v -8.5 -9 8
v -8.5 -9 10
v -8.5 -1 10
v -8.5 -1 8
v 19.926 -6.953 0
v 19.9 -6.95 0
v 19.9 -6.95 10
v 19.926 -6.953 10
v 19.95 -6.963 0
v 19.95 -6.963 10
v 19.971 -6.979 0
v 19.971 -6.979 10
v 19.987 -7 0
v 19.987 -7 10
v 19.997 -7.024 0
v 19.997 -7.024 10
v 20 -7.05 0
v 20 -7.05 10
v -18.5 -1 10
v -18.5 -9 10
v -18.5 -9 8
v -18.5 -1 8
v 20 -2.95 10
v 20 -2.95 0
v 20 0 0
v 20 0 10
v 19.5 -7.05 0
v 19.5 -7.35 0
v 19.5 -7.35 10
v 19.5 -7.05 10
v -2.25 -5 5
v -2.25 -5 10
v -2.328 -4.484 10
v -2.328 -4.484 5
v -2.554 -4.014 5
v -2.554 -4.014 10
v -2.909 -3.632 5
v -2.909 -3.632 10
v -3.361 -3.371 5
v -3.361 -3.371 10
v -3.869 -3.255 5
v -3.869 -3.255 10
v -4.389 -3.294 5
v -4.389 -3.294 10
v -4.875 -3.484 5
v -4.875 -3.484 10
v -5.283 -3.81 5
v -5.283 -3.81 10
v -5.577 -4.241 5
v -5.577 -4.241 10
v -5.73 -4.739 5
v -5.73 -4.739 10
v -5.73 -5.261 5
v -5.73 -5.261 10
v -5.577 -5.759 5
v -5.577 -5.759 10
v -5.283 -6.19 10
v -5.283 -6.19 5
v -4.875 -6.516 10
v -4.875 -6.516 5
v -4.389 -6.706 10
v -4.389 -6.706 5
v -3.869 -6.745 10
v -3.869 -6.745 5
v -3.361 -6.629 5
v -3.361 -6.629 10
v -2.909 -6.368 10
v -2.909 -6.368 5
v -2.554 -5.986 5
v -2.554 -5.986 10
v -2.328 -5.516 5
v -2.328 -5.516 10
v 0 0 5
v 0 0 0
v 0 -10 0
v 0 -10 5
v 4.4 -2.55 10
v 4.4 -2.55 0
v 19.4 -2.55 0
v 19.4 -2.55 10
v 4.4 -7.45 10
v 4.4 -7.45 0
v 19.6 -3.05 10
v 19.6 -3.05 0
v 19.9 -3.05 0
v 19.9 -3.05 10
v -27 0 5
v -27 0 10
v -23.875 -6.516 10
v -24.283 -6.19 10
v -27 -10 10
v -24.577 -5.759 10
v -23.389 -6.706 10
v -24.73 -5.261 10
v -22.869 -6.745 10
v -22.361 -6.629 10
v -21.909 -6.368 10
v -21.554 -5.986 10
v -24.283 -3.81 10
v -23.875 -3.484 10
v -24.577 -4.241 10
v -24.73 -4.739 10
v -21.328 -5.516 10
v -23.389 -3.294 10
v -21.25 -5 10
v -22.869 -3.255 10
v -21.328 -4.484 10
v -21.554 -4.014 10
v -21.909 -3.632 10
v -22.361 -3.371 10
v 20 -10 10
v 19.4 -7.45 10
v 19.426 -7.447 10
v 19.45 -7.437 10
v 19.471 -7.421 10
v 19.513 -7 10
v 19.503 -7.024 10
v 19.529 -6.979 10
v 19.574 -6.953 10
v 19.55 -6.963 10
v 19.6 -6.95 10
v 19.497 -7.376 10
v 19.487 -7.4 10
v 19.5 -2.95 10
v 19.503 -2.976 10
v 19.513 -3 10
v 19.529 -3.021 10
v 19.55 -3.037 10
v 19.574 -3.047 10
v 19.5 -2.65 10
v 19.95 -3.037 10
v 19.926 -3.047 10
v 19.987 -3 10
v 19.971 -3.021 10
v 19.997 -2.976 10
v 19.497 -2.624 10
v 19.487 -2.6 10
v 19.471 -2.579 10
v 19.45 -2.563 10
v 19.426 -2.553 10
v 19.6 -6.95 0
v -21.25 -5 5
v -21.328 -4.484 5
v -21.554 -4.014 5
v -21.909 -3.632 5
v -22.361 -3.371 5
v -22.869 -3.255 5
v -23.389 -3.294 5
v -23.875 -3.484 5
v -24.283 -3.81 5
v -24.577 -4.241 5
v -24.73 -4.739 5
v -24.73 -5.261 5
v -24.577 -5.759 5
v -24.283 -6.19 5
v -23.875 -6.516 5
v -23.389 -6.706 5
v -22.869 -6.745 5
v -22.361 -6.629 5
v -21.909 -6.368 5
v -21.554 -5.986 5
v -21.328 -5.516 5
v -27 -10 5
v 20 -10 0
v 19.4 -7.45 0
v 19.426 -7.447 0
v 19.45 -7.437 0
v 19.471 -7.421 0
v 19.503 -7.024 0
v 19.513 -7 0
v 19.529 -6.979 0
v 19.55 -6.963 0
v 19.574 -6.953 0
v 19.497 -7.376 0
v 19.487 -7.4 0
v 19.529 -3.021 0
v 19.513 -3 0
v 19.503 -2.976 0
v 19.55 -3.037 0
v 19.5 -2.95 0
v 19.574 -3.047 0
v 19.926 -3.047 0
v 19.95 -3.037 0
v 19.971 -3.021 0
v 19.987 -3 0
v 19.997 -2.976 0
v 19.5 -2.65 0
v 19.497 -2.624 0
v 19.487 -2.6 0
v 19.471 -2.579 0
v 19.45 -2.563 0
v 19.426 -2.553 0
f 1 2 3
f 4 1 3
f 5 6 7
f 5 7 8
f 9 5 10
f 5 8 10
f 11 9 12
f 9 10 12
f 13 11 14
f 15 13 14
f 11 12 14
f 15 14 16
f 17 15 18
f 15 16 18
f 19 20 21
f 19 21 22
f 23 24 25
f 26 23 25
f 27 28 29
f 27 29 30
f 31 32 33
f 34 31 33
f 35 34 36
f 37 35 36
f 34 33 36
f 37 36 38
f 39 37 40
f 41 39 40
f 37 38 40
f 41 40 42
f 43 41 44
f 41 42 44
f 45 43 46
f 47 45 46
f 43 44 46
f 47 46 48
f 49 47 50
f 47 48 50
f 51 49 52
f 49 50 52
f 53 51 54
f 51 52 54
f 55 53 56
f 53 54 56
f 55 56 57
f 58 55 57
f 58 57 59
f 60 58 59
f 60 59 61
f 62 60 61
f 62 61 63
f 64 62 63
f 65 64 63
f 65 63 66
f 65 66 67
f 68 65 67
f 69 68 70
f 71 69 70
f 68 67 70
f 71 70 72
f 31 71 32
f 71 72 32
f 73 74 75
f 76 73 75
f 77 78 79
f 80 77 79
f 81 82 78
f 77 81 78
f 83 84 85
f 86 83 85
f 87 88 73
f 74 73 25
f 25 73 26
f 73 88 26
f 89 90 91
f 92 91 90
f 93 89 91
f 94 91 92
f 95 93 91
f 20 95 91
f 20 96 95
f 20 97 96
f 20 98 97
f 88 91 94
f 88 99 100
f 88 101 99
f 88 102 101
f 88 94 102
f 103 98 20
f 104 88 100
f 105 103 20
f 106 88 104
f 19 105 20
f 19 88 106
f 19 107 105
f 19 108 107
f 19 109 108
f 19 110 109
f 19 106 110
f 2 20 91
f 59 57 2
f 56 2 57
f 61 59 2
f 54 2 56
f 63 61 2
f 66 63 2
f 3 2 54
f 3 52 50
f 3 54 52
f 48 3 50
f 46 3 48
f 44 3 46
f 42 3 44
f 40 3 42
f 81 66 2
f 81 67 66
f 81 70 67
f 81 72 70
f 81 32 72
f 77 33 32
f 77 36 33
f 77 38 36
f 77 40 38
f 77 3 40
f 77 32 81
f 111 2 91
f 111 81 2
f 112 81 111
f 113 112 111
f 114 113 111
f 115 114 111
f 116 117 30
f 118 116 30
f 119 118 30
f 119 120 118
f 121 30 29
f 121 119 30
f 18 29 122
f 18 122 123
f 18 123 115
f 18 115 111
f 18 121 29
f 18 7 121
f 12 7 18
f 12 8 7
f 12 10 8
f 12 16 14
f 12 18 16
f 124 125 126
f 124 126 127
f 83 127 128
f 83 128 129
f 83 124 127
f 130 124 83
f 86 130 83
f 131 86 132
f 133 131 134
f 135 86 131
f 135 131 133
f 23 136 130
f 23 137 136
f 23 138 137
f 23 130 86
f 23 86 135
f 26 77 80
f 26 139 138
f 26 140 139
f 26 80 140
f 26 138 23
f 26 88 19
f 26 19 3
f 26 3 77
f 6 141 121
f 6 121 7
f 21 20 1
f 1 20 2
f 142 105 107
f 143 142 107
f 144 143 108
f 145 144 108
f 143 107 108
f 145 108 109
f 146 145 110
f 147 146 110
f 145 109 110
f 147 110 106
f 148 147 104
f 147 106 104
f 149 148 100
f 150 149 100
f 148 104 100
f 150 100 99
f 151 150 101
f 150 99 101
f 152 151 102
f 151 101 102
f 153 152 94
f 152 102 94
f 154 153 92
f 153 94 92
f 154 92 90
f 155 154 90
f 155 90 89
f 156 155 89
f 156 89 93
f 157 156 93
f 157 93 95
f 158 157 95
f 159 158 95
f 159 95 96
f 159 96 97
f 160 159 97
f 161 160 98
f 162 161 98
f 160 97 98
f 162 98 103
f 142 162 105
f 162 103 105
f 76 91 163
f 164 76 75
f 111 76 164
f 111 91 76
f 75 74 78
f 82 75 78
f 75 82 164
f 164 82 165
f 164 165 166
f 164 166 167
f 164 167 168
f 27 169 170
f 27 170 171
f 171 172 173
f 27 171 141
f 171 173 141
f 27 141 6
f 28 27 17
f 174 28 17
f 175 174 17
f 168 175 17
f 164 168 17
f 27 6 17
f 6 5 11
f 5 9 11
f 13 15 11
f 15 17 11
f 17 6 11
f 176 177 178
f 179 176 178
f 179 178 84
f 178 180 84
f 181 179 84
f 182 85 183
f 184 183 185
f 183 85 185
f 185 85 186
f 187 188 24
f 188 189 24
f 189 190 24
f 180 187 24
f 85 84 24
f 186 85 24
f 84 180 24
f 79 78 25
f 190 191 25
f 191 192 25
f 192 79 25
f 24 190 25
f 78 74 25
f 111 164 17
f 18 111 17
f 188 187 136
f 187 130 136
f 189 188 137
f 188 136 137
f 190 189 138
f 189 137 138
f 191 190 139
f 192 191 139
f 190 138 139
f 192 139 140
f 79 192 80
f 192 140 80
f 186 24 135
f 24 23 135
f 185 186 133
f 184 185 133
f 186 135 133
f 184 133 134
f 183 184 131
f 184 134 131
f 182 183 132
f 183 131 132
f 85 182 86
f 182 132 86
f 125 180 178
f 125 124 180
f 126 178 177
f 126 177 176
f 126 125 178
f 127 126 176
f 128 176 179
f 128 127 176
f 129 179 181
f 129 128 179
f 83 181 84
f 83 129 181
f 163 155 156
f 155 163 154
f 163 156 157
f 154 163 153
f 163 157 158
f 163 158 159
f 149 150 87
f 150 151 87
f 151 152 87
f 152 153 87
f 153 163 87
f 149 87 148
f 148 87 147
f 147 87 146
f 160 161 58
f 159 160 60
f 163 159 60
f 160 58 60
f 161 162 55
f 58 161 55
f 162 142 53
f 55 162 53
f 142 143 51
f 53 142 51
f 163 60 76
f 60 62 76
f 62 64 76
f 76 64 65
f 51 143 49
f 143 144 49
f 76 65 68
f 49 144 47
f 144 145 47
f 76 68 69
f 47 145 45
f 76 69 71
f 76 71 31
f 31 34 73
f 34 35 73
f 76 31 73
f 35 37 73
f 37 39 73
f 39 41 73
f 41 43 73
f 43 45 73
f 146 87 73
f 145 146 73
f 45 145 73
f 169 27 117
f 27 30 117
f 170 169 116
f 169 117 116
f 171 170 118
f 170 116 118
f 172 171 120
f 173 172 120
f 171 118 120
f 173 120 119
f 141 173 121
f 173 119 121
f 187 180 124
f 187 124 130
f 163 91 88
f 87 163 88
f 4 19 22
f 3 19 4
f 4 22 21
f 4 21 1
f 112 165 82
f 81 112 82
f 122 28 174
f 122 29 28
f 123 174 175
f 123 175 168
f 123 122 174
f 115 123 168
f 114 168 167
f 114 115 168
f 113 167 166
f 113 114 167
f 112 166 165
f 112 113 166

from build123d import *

# Parameters (mm, degrees)
SKETCH1_W           = 0.5
SKETCH1_H           = 0.5
BOSS_EXTRUDE1_DEPTH = 10
SKETCH2_W           = 27
SKETCH2_H           = 10
SKETCH2_R           = 1.75
BOSS_EXTRUDE2_DEPTH = 5
SKETCH3_W           = 10
SKETCH3_H           = 8
CUT_EXTRUDE3_DEPTH  = 2
FILLET1_R           = 0.1
FILLET2_R           = 0.1


with BuildPart() as part:
    # Sketch1 → Boss-Extrude1 (new body)
    with BuildSketch(Plane.XY):
        Polygon((20, 0), (0, 0), (0, -10), (20, -10), (20, -7.45), (19.5, -7.45), (4.4, -7.45), (4.4, -2.55), (19.5, -2.55), (20, -2.55), align=None)
        with Locations((19.75, -7.2)):
            Rectangle(SKETCH1_W, SKETCH1_H)
        with Locations((19.75, -2.8)):
            Rectangle(SKETCH1_W, SKETCH1_H)
    extrude(amount=BOSS_EXTRUDE1_DEPTH)

    # Sketch2 → Boss-Extrude2 (add)
    with BuildSketch(Plane.XY.offset(10)):
        with Locations((-13.5, -5)):
            Rectangle(SKETCH2_W, SKETCH2_H)
        with Locations((-23, -5)):
            Circle(SKETCH2_R, mode=Mode.SUBTRACT)
        with Locations((-4, -5)):
            Circle(SKETCH2_R, mode=Mode.SUBTRACT)
    extrude(amount=-BOSS_EXTRUDE2_DEPTH)

    # Sketch3 → Cut-Extrude3 (cut)
    with BuildSketch(Plane.XY.offset(10)):
        with Locations((-13.5, -5)):
            Rectangle(SKETCH3_W, SKETCH3_H)
    extrude(amount=-CUT_EXTRUDE3_DEPTH, mode=Mode.SUBTRACT)

    # Fillet1
    fillet1_edges = [part.edges().sort_by_distance(p)[0] for p in [
        (19.5, -7.45, 5),
        (19.5, -2.55, 5),
    ]]
    fillet(fillet1_edges, radius=FILLET1_R)

    # Fillet2
    fillet2_edges = [part.edges().sort_by_distance(p)[0] for p in [
        (19.5, -6.95, 5),
        (20, -6.95, 5),
        (20, -3.05, 5),
        (19.5, -3.05, 5),
    ]]
    fillet(fillet2_edges, radius=FILLET2_R)


solid = part.part
